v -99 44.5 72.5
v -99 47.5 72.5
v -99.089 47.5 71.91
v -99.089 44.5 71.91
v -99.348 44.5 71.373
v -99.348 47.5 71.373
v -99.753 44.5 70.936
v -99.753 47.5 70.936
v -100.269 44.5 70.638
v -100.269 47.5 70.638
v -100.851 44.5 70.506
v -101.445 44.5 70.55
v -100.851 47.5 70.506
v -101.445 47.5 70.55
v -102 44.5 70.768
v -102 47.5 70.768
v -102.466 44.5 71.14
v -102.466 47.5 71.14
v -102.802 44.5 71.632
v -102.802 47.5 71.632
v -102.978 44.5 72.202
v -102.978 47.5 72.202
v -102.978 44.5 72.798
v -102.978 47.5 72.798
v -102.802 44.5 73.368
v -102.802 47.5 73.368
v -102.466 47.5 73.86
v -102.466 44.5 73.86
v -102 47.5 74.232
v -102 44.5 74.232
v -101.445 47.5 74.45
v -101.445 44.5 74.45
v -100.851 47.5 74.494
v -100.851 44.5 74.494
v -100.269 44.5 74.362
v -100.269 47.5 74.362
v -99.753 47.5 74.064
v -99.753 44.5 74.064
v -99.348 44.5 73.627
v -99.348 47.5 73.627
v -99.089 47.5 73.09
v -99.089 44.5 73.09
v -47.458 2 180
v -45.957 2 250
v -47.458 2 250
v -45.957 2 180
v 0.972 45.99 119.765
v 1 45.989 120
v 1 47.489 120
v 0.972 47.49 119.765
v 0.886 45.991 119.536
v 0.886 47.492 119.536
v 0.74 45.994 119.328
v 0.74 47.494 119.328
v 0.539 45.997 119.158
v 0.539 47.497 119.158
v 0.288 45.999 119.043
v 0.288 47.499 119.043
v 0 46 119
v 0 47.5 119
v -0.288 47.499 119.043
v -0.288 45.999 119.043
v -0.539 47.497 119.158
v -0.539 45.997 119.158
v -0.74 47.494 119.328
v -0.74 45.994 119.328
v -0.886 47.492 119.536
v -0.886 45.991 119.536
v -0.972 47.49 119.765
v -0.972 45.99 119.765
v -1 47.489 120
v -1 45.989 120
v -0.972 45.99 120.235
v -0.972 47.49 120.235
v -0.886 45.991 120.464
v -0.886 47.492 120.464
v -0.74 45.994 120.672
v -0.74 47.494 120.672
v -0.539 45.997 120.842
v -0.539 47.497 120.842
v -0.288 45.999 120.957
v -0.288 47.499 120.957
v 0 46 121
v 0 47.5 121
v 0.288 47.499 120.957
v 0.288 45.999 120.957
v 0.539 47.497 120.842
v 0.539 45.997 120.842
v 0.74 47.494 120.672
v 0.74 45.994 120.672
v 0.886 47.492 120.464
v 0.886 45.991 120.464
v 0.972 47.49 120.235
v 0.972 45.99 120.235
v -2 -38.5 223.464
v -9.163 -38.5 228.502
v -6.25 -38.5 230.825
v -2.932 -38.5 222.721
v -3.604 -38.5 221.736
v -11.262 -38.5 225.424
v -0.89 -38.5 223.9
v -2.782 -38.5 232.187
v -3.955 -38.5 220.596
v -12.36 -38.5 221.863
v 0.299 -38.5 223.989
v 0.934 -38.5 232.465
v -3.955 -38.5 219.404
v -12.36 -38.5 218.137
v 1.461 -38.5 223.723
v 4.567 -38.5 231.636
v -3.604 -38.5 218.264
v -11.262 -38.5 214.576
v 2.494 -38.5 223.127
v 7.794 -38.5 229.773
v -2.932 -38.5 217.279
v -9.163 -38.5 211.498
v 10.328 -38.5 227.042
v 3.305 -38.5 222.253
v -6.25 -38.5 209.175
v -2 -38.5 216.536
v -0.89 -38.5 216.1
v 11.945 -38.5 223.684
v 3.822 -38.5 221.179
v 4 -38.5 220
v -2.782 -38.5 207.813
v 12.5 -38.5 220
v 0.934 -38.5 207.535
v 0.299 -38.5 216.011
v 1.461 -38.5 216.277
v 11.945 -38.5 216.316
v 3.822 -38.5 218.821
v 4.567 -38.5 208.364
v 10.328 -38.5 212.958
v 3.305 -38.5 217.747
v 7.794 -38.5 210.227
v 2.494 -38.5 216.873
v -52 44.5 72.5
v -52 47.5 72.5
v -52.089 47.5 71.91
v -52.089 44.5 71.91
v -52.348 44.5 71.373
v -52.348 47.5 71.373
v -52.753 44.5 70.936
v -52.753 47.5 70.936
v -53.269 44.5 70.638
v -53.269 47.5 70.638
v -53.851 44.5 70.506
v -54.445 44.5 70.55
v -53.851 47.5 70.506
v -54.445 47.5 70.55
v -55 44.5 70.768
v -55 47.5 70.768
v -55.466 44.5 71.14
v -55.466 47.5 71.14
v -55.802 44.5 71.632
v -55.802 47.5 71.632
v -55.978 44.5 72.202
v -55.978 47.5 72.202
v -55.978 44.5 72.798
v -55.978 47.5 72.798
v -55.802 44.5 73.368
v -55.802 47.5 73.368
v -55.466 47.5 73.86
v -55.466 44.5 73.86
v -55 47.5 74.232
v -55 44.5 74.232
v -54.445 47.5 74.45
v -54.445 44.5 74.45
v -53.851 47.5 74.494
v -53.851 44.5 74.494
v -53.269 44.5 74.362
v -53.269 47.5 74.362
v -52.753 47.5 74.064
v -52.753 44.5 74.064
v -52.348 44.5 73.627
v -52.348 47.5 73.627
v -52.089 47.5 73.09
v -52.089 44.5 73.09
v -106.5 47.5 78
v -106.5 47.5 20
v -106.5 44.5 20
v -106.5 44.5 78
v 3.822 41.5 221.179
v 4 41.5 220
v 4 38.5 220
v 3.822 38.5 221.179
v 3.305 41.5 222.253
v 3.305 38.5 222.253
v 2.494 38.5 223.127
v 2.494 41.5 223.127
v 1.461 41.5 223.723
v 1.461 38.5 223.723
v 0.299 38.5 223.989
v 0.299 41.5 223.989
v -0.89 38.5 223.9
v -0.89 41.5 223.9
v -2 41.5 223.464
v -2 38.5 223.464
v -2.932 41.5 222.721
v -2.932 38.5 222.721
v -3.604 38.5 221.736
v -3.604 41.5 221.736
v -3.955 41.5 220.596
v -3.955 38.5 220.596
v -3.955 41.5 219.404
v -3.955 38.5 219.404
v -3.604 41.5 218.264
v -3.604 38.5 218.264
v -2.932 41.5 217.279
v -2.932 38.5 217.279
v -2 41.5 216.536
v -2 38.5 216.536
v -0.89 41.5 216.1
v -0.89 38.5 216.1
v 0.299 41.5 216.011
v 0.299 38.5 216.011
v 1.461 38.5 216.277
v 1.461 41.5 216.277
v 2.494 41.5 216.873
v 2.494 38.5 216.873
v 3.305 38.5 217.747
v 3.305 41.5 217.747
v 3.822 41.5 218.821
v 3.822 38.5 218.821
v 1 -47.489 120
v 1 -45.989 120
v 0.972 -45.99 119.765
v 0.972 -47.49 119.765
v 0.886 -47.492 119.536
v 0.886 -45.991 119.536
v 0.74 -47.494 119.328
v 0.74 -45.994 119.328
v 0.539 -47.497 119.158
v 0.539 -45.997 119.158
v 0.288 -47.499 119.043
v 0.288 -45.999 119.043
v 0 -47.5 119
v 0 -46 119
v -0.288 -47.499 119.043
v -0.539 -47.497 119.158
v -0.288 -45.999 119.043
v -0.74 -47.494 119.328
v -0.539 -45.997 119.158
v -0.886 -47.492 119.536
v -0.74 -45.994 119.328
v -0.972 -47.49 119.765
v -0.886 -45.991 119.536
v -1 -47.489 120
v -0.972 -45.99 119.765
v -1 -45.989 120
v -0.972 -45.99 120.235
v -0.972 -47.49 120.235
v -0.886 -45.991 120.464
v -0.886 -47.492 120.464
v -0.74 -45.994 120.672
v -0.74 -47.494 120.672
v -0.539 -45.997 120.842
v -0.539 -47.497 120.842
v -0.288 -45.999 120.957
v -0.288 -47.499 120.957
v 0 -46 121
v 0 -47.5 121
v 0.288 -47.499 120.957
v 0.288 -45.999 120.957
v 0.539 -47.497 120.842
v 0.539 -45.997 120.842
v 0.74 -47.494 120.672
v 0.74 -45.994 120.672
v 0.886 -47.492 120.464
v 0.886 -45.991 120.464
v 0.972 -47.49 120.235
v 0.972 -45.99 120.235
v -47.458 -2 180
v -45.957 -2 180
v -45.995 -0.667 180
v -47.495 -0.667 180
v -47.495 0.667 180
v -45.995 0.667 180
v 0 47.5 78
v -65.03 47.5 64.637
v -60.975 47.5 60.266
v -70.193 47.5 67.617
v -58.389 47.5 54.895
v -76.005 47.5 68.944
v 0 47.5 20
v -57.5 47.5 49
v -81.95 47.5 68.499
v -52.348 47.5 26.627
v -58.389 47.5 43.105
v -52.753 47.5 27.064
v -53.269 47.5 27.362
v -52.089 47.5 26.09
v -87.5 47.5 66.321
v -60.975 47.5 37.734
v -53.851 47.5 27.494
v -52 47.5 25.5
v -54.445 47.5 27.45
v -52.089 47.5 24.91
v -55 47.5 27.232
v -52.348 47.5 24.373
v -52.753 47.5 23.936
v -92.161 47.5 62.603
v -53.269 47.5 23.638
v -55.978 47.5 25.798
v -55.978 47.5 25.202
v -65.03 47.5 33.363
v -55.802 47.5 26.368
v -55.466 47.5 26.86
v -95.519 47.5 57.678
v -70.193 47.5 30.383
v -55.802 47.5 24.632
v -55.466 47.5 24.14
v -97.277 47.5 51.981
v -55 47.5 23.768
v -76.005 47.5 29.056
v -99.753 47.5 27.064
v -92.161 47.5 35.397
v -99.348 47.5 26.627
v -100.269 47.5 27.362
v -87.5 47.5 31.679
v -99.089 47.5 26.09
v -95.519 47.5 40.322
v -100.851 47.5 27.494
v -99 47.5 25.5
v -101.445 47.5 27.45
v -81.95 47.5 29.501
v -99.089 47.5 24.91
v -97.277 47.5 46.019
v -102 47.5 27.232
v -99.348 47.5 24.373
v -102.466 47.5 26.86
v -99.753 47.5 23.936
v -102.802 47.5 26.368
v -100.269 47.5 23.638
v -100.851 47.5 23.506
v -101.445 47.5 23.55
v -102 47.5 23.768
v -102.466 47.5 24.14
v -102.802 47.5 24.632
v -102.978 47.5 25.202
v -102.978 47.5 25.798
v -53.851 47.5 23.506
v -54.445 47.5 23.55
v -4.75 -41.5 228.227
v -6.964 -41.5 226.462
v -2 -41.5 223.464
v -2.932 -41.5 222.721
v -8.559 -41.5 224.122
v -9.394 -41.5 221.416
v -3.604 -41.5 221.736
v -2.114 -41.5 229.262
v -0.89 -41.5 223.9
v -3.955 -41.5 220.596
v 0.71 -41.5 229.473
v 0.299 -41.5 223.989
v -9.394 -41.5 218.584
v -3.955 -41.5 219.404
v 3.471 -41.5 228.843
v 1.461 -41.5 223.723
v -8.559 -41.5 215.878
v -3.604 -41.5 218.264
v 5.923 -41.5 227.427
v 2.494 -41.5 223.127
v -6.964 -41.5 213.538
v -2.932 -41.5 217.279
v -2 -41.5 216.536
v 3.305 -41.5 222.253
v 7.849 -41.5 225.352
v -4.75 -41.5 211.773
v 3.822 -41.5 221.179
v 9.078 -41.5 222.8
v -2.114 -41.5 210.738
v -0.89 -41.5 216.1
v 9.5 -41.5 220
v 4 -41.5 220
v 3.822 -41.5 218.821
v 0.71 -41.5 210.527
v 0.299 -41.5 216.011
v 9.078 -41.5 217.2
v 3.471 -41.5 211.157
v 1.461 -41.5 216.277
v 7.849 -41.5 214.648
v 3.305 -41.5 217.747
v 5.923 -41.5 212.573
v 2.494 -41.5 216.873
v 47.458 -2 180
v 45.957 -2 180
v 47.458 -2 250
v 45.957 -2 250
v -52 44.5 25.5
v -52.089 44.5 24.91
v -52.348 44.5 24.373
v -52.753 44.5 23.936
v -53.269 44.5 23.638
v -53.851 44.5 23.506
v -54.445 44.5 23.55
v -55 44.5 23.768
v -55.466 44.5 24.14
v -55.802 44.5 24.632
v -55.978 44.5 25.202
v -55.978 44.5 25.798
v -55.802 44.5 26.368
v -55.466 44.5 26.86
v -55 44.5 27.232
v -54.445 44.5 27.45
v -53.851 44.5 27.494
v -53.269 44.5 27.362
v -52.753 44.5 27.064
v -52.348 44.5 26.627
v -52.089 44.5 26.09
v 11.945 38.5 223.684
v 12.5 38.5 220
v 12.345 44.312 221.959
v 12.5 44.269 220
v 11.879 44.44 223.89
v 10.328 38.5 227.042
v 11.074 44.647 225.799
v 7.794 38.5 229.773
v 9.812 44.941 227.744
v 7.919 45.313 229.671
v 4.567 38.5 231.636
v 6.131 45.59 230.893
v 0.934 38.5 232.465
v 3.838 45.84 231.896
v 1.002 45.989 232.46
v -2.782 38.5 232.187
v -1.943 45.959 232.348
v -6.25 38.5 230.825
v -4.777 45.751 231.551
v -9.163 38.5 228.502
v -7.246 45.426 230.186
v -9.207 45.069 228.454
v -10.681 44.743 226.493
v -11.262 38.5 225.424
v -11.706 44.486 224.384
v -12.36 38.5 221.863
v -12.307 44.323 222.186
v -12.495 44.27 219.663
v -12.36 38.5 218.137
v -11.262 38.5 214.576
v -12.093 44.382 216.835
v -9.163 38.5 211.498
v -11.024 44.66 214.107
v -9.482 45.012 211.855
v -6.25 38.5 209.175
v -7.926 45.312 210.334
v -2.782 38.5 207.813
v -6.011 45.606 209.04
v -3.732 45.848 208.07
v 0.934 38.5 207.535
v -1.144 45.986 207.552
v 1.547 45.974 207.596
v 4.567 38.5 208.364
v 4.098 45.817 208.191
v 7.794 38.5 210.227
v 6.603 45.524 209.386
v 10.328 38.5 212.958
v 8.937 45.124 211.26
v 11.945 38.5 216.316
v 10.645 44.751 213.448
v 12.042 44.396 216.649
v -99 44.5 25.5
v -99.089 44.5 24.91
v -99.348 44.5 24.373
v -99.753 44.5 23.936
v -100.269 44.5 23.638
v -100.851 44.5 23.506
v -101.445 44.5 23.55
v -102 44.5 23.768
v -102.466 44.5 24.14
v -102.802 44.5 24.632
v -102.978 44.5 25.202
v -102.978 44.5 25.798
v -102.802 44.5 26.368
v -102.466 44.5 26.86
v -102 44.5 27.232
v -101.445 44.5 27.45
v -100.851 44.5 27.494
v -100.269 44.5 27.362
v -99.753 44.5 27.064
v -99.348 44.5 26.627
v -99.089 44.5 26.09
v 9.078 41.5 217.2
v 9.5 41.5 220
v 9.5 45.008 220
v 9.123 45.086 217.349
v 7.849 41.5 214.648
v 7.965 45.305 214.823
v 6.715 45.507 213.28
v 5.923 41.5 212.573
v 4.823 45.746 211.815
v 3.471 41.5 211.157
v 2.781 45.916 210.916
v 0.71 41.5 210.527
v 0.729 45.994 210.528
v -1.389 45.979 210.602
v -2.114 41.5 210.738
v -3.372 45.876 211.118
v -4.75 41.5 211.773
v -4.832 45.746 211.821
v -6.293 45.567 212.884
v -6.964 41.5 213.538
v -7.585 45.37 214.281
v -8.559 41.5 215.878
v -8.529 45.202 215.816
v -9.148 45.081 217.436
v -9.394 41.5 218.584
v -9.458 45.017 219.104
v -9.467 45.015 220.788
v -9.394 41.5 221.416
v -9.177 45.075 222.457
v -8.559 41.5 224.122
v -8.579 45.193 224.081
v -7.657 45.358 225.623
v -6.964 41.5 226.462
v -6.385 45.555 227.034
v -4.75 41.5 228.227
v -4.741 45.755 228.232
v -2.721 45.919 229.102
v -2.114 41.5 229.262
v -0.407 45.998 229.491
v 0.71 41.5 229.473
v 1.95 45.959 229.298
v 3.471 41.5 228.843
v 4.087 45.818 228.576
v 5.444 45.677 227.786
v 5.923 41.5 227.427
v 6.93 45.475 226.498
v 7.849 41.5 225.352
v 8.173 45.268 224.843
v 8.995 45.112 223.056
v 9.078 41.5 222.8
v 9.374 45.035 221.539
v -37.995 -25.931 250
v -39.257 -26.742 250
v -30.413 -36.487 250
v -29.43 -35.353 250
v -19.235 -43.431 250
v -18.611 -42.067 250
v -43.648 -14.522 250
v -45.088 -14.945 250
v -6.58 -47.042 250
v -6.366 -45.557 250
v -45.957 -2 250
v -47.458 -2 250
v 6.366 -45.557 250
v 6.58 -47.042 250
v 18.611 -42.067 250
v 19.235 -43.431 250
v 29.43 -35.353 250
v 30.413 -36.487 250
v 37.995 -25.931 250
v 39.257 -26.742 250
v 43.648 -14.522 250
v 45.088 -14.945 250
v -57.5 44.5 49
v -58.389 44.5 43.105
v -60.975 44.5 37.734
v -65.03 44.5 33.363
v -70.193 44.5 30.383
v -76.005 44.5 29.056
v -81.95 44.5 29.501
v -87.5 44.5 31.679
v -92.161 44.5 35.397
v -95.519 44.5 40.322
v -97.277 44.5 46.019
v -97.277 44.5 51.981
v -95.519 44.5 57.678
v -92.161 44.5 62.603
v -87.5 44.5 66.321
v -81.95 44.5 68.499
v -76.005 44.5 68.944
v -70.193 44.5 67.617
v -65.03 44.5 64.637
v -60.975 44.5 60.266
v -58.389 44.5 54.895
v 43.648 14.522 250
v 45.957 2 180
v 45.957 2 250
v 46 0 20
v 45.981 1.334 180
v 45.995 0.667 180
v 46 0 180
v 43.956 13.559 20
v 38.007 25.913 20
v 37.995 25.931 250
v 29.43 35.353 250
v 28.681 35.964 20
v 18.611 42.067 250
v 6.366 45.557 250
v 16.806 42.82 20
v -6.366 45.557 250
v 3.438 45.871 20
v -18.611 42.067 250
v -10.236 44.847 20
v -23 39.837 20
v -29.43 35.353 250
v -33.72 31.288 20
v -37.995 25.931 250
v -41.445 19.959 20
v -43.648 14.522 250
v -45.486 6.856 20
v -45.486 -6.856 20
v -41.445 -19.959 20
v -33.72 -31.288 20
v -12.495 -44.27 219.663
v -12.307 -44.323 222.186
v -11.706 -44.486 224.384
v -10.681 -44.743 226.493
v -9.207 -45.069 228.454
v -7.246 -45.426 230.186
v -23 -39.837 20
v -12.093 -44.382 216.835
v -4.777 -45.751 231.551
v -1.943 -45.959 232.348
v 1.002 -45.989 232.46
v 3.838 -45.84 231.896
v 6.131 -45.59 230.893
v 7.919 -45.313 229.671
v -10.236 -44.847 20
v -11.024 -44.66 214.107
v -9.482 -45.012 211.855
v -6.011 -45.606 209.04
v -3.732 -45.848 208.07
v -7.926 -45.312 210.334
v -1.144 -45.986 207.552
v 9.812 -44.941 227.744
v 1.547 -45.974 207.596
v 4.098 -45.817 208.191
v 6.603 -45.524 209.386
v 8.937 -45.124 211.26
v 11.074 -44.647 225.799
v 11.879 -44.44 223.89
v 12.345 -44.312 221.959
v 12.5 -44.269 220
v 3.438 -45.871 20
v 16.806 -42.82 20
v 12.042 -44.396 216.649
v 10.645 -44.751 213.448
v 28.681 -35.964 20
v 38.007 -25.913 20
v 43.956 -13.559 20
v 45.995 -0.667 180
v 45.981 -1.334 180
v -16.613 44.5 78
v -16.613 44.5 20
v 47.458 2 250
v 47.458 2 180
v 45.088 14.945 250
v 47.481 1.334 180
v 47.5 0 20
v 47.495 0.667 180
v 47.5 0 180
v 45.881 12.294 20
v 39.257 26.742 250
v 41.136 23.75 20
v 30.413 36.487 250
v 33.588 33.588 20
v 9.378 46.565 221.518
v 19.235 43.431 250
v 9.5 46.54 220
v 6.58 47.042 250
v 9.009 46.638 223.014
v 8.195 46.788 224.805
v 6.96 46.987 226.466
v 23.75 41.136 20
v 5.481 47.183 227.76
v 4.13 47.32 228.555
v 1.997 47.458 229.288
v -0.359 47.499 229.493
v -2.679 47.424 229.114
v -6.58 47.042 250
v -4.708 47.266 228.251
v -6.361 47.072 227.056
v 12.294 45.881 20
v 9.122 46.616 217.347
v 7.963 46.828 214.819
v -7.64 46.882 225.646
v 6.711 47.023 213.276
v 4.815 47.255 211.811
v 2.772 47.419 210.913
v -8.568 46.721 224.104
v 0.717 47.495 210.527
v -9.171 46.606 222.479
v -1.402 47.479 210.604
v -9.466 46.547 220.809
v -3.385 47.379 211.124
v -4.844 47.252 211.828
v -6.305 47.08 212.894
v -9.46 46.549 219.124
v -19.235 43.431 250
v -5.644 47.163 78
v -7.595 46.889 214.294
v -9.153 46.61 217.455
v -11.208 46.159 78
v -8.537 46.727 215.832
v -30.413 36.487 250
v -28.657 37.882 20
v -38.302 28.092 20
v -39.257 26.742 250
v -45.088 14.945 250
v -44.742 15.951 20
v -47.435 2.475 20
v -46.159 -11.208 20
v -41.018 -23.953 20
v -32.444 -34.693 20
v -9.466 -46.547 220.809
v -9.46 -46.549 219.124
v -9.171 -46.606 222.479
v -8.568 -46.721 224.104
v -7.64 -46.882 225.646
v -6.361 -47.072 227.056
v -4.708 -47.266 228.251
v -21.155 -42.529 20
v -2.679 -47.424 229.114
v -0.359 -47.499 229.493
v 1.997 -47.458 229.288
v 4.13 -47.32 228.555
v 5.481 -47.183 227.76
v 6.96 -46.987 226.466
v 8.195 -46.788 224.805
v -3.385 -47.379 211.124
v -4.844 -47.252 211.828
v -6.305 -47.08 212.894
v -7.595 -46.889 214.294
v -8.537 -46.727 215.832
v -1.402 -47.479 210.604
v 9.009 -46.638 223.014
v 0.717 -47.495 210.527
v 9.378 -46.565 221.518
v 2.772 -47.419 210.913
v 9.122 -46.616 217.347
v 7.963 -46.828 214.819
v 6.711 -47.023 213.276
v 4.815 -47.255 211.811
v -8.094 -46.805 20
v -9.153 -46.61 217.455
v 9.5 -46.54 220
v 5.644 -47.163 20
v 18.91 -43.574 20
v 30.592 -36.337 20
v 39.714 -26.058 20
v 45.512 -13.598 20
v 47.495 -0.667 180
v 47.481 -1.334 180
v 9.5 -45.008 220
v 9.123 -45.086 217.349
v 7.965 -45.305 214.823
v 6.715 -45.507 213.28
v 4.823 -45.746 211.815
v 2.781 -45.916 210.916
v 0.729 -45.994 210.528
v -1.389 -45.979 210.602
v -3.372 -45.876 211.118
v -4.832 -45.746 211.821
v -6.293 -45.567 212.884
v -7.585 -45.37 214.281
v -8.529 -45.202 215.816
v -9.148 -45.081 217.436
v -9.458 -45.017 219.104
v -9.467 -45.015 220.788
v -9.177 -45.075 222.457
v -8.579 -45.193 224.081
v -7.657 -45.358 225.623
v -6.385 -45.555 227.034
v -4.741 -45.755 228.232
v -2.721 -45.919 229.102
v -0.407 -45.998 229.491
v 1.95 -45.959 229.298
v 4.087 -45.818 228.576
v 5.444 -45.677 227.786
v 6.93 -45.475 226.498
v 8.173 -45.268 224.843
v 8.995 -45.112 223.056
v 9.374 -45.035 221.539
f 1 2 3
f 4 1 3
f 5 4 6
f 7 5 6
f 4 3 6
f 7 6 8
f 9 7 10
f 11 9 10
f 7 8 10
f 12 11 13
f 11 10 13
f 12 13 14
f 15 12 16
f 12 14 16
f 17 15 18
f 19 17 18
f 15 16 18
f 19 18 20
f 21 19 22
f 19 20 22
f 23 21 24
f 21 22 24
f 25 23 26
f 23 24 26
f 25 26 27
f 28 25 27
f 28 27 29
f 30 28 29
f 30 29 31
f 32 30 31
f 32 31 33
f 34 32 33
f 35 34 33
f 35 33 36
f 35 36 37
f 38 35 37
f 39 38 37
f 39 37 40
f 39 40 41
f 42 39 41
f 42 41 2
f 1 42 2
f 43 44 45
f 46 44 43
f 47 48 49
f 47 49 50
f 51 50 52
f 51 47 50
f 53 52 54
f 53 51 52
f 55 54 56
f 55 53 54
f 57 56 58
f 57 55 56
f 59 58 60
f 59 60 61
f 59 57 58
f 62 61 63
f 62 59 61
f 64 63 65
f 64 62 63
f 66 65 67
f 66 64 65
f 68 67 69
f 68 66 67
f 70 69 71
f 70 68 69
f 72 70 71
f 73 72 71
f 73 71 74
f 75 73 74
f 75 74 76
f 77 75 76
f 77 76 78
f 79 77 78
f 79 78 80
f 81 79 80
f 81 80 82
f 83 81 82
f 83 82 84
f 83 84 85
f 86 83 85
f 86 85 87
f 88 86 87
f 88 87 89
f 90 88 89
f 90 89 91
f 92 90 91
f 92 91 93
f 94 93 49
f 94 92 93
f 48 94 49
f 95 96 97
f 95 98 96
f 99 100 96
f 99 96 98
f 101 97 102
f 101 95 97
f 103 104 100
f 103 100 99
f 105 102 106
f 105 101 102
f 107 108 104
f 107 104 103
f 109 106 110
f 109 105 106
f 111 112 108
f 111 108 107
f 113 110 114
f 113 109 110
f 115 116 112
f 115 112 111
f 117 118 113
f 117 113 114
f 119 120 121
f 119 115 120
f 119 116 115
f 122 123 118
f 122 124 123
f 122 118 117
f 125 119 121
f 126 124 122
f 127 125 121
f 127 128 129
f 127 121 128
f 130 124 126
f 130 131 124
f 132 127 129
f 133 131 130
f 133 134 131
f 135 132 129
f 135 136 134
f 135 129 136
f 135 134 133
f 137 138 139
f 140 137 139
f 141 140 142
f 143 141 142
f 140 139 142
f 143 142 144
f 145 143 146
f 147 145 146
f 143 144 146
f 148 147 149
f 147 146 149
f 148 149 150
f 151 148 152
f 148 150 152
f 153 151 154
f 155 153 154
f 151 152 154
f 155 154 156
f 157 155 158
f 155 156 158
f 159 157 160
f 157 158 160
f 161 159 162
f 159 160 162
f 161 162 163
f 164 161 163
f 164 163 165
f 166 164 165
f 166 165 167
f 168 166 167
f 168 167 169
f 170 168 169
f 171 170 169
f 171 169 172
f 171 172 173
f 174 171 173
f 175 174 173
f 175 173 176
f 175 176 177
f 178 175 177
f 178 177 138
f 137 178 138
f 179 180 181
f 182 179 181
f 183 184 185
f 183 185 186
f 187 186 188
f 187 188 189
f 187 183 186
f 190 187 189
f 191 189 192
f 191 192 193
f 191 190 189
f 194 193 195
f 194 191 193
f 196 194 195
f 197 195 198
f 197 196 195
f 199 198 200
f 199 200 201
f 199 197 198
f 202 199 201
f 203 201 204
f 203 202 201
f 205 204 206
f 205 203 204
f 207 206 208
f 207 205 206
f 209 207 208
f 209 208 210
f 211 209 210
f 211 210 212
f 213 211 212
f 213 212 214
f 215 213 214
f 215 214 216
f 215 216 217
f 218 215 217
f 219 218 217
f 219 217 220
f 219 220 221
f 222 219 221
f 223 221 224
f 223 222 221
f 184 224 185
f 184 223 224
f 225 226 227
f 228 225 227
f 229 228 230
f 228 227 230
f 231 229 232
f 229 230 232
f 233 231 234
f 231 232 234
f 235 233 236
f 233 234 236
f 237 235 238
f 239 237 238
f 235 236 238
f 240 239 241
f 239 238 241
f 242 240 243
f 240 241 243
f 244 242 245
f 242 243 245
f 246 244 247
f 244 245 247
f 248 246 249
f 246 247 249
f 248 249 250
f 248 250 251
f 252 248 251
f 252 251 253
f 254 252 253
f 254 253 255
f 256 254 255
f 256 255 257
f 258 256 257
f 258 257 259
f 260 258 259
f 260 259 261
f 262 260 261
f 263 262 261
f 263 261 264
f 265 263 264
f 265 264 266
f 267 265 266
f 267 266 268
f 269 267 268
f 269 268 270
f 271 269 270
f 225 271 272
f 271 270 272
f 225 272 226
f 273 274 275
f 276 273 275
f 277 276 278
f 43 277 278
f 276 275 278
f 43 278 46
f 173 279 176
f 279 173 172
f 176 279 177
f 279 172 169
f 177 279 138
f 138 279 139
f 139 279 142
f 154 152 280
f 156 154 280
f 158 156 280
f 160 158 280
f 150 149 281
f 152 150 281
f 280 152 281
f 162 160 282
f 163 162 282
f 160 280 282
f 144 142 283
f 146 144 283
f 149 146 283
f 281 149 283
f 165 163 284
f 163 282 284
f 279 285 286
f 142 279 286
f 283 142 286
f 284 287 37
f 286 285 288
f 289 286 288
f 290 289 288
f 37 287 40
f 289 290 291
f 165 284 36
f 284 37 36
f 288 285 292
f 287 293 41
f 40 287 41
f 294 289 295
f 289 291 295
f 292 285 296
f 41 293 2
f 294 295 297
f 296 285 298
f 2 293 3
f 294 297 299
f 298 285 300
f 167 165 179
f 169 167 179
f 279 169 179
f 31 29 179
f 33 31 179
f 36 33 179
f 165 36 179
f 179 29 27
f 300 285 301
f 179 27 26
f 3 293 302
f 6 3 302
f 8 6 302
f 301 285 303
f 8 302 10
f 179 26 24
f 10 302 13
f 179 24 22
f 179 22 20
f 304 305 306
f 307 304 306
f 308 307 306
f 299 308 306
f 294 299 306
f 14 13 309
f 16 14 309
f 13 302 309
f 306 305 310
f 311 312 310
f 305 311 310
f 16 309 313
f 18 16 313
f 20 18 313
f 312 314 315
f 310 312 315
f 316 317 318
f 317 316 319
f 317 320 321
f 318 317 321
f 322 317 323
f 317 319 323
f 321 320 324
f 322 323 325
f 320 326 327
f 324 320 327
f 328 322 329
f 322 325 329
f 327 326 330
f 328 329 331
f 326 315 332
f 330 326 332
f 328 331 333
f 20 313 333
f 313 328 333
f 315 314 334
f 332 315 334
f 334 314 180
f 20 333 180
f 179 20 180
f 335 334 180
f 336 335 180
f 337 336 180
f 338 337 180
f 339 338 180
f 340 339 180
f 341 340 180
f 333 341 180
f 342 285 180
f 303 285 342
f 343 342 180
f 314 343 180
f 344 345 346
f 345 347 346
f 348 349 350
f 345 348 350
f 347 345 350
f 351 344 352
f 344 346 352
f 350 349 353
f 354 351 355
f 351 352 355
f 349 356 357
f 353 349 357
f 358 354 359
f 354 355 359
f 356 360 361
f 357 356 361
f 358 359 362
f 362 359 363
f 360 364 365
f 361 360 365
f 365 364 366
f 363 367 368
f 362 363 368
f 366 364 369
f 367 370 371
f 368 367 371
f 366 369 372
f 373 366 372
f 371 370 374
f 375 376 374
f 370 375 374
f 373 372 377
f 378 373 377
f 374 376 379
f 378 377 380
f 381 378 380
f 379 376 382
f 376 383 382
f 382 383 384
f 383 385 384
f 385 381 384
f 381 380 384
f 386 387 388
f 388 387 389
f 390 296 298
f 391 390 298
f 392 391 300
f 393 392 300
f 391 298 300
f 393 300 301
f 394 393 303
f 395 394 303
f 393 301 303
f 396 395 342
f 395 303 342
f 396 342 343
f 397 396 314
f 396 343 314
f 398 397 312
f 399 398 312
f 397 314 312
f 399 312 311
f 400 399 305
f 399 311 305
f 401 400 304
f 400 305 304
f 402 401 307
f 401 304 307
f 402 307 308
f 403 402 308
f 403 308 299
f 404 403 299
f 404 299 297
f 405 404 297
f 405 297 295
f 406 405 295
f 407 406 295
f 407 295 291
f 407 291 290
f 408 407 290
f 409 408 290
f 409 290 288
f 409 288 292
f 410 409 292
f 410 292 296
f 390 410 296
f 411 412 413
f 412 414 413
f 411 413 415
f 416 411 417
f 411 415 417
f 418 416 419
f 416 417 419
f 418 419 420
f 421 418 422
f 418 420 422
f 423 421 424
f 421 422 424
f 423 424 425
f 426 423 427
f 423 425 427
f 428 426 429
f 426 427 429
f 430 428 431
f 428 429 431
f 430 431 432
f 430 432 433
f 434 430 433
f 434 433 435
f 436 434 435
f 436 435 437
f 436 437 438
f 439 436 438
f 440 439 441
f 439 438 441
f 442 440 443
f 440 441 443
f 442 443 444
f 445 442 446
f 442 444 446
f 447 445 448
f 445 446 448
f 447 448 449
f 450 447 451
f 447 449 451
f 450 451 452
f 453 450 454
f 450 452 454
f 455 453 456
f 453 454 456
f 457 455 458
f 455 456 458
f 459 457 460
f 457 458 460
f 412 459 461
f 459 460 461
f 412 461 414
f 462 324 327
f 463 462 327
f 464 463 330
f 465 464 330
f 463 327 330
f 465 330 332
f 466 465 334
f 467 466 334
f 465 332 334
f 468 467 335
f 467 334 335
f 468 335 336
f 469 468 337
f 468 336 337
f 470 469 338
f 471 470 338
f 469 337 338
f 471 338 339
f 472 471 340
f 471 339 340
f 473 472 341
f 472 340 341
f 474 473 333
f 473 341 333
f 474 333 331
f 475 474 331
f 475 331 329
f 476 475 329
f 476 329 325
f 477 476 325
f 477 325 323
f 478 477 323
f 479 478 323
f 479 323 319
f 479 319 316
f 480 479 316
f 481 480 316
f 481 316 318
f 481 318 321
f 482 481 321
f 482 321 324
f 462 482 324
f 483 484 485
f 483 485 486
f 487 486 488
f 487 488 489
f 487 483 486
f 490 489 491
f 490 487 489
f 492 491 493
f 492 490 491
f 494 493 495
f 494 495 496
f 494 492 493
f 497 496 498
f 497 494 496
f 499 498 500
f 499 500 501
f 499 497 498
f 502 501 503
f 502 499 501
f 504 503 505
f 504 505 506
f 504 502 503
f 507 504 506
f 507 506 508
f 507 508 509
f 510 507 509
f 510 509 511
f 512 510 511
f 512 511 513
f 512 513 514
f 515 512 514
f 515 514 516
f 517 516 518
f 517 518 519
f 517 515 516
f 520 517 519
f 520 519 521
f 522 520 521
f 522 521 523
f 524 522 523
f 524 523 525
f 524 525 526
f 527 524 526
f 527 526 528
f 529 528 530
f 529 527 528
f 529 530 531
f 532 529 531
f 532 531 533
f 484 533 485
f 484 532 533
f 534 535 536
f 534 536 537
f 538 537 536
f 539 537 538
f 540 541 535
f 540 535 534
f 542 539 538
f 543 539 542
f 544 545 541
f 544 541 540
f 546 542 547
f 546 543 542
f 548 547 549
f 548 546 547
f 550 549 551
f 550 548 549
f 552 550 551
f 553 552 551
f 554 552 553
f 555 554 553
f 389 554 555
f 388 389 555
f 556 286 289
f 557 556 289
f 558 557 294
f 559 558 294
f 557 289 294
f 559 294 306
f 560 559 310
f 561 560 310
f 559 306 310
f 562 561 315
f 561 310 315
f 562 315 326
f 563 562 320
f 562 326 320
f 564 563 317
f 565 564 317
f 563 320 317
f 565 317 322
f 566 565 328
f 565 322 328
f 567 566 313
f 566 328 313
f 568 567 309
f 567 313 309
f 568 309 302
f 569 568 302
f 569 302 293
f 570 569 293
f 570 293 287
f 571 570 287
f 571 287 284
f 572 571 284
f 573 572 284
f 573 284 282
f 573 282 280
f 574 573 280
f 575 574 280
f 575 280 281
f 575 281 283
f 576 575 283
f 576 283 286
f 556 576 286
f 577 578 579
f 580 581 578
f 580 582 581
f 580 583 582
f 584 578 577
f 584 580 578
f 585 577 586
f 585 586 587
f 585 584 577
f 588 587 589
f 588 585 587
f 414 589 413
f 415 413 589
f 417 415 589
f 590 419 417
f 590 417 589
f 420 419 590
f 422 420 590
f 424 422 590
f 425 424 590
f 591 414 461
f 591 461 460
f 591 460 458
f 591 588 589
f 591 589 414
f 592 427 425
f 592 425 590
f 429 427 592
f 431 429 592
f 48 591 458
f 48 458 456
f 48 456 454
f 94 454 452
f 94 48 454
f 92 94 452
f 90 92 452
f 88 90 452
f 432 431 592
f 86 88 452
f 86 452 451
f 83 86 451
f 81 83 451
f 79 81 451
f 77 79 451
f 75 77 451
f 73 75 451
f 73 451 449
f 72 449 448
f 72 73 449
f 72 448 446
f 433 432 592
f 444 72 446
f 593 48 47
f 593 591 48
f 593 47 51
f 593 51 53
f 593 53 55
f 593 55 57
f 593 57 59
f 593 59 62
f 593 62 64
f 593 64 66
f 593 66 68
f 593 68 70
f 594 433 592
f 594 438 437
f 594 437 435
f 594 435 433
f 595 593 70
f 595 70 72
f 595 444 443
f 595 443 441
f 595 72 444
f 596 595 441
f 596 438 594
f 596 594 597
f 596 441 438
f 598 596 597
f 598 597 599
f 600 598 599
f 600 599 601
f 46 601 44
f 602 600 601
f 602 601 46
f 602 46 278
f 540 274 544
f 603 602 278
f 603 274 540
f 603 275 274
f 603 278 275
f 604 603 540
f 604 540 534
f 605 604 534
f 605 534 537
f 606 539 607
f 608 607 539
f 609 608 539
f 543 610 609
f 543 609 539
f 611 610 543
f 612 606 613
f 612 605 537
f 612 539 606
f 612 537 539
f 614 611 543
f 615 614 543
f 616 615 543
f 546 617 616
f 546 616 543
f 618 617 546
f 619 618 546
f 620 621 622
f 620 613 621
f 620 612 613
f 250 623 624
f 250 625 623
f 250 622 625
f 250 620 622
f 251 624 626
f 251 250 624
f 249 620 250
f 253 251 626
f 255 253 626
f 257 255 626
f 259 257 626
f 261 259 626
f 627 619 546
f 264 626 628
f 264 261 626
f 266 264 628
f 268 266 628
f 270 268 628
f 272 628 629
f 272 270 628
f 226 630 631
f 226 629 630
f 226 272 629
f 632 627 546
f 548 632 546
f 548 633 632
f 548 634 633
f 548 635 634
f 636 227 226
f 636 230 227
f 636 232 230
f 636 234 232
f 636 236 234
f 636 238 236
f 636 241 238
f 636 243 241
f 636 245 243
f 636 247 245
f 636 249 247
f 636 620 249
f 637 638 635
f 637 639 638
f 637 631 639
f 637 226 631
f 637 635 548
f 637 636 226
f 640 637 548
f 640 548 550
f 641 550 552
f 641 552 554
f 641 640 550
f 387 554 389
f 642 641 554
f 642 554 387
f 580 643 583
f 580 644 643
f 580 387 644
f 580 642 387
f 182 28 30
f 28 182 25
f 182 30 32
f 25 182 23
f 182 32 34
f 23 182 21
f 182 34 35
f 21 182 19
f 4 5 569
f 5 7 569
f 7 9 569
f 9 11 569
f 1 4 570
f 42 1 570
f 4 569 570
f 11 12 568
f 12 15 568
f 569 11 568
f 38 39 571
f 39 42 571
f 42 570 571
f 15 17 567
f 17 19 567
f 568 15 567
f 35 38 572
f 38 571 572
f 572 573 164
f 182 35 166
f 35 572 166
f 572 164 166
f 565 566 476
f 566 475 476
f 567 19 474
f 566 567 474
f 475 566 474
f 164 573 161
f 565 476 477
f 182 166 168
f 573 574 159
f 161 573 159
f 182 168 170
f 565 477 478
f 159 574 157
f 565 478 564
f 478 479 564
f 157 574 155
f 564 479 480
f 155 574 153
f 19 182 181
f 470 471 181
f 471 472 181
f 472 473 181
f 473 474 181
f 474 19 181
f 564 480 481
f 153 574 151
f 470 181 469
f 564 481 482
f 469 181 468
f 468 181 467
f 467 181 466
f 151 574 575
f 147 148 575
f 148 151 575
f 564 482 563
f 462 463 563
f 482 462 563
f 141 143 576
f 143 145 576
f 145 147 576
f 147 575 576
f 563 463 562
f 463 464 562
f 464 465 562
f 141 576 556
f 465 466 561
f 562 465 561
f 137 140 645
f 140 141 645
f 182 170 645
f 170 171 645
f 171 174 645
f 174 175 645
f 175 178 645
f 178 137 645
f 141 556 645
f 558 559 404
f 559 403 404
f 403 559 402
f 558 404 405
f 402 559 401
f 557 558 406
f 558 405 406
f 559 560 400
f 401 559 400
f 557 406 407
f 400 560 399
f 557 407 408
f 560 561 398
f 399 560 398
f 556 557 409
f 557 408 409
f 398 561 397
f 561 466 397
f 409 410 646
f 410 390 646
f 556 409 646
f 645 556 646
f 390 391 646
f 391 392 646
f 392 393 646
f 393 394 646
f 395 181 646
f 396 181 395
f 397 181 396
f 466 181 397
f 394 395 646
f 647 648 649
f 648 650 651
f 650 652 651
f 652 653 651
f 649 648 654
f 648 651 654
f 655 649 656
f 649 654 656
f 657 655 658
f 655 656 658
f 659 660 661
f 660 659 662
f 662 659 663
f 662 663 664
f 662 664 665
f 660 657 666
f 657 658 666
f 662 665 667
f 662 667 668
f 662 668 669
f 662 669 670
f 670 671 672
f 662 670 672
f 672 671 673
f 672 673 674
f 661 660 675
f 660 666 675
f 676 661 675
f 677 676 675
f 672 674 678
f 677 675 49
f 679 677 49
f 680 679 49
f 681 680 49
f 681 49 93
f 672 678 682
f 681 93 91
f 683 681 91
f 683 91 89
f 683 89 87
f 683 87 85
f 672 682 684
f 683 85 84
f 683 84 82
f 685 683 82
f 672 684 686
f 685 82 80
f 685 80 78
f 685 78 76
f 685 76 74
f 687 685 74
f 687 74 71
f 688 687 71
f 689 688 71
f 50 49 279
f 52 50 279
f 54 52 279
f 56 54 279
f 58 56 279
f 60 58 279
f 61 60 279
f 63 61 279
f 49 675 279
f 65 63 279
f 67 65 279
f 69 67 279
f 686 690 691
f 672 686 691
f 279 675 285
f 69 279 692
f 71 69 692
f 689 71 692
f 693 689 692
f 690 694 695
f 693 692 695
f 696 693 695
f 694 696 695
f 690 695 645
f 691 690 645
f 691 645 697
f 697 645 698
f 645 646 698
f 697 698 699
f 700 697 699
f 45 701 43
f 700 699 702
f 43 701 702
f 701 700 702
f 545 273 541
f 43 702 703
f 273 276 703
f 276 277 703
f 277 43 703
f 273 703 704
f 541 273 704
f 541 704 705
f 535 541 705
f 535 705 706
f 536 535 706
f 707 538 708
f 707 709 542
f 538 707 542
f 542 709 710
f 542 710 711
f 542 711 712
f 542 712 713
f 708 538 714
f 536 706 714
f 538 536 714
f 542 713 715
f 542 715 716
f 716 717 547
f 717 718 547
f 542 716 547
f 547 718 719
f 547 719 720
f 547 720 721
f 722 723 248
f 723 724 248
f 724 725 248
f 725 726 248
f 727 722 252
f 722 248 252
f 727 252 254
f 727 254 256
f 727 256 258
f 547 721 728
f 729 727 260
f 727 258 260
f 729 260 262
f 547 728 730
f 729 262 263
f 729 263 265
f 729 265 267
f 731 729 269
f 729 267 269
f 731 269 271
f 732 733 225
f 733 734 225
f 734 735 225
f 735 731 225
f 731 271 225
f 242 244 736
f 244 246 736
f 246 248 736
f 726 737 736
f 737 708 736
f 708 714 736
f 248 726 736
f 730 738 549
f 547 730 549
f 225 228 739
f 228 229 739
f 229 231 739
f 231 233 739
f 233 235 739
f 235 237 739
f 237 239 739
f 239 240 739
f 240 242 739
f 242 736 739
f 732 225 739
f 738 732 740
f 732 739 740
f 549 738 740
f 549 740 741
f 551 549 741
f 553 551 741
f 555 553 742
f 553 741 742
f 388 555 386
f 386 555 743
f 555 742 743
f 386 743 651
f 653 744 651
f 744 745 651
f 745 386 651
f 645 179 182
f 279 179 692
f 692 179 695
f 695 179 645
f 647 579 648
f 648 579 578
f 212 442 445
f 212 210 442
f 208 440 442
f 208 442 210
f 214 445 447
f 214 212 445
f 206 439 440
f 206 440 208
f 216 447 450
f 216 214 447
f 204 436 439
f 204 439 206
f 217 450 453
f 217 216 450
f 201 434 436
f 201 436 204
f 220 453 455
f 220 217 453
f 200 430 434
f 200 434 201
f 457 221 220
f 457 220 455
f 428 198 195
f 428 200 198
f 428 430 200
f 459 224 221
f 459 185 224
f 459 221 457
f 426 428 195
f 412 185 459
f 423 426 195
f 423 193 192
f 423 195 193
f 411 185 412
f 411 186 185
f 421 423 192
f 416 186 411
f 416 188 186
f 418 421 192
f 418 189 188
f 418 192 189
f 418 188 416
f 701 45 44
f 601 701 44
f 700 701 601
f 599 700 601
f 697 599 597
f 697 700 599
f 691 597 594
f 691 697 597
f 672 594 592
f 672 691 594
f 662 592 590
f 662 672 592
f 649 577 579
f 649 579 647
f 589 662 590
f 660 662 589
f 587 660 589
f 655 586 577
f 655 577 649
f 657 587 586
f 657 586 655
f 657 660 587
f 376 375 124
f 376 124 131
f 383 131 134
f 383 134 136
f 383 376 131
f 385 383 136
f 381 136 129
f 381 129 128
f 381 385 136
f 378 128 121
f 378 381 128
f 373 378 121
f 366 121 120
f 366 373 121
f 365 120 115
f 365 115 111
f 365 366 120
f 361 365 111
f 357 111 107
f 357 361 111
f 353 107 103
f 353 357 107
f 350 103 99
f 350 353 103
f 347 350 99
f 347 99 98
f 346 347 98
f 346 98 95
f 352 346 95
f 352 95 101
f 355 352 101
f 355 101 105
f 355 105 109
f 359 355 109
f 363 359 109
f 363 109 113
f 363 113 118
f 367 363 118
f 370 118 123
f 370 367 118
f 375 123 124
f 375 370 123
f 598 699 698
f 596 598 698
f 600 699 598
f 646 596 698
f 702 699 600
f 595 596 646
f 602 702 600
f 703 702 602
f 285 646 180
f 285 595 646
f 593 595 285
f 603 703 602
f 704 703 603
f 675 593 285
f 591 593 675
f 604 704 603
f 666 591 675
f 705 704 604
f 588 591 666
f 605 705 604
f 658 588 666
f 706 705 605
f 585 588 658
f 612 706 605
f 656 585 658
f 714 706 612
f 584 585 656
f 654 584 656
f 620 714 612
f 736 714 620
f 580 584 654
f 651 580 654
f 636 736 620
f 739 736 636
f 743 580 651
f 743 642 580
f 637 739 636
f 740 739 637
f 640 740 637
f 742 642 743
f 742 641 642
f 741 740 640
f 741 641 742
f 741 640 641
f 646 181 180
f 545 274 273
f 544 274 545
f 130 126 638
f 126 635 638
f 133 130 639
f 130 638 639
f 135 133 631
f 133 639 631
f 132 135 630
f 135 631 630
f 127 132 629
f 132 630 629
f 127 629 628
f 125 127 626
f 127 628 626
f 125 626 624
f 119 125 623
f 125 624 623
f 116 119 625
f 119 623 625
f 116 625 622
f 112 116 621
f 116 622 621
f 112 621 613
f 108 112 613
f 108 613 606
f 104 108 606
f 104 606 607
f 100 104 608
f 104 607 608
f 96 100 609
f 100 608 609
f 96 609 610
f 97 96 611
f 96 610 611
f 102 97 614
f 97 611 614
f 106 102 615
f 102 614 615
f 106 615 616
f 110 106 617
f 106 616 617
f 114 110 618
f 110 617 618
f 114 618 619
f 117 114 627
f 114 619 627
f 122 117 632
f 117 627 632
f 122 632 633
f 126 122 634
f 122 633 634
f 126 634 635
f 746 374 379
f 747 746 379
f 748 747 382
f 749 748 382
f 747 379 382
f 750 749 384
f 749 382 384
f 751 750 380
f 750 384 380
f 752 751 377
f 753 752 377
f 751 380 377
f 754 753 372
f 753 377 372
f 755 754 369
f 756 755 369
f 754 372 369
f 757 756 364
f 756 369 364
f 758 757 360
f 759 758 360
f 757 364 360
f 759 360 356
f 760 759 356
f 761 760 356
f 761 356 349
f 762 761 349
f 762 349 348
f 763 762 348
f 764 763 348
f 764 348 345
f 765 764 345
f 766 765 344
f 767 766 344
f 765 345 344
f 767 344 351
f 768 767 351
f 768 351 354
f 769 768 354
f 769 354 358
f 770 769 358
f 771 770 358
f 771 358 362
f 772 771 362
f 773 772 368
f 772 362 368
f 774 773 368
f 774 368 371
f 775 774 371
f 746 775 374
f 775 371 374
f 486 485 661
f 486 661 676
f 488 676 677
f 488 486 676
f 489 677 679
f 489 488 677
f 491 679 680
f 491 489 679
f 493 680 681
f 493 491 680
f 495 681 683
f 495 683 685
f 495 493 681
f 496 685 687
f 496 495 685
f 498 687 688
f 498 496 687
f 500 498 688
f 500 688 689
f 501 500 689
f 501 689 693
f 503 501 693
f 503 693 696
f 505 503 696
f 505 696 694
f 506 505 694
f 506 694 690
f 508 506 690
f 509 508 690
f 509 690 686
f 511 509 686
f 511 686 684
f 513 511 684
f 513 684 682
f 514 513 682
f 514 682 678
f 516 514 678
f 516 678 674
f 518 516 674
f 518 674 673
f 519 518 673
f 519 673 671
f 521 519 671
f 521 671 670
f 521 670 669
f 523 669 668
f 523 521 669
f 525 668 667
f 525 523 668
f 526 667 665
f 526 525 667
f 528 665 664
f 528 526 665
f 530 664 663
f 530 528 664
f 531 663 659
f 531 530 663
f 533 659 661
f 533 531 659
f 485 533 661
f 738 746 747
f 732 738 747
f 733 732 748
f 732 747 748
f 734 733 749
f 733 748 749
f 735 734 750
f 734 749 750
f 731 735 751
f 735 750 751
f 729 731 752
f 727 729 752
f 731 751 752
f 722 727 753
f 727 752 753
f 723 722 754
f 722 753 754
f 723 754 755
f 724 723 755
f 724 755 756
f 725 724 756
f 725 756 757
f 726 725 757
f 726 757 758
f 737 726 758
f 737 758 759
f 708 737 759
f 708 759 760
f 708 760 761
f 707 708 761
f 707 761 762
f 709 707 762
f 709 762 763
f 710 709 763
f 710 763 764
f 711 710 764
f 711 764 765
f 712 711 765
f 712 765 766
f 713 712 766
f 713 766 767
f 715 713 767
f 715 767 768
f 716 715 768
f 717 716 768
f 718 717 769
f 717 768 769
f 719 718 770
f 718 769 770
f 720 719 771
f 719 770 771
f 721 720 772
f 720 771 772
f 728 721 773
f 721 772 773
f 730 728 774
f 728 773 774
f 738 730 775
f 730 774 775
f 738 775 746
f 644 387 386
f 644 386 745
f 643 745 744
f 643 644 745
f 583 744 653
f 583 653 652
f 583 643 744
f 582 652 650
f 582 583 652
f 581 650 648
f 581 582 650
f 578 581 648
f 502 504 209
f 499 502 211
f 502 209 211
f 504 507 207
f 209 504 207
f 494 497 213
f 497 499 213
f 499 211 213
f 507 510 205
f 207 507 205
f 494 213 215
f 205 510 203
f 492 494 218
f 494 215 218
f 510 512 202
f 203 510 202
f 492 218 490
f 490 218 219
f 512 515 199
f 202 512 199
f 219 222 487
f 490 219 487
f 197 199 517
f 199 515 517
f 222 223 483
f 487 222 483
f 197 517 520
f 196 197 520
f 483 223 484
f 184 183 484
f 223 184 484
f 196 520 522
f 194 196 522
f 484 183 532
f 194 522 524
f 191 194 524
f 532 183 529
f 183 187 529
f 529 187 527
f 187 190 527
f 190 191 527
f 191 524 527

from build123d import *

# Parameters (mm, degrees)
SKETCH1_R               = 47.5
SKETCH1_R_2             = 46
BOSS_EXTRUDE1_DEPTH     = 250
CUT_EXTRUDE1_DEPTH      = 250
CUT_EXTRUDE1_DEPTH_BACK = 250
SKETCH2_R               = 1
CUT_EXTRUDE2_DEPTH      = 75
CUT_EXTRUDE2_DEPTH_BACK = 79
SKETCH3_W               = 95
SKETCH3_H               = 20
CUT_EXTRUDE3_DEPTH      = 64
CUT_EXTRUDE3_DEPTH_BACK = 73
SKETCH4_R               = 9.5
BOSS_EXTRUDE2_REACH     = 271.587
SKETCH5_R               = 12.5
SKETCH5_R_2             = 9.5
BOSS_EXTRUDE7_START     = 3
SKETCH10_R              = 12.5
SKETCH10_R_2            = 4
BOSS_EXTRUDE7_DEPTH     = 3
BOSS_EXTRUDE8_REACH     = 271.587
SKETCH12_R              = 12.5
SKETCH12_R_2            = 9.5
SKETCH13_R              = 12.5
SKETCH13_R_2            = 4
BOSS_EXTRUDE9_DEPTH     = 3
BOSS_EXTRUDE11_DEPTH    = 58
SKETCH18_R              = 2
SKETCH18_R_2            = 20
CUT_EXTRUDE5_DEPTH      = 58
CUT_EXTRUDE6_DEPTH      = 98
CUT_EXTRUDE6_DEPTH_BACK = 82


with BuildPart() as part:
    # Sketch1 → Boss-Extrude1 (new body)
    with BuildSketch(Plane.XY):
        Circle(SKETCH1_R)
        Circle(SKETCH1_R_2, mode=Mode.SUBTRACT)
    extrude(amount=BOSS_EXTRUDE1_DEPTH)

    # Sketch2 → Cut-Extrude1 (cut, two sides: drawn at the far end of the back side and taken through both)
    with BuildSketch(Plane(origin=(0, 0, 0), x_dir=(1, 0, 0), z_dir=(0, 1, 0)).offset(-CUT_EXTRUDE1_DEPTH_BACK)):
        with Locations((0, -120)):
            Circle(SKETCH2_R)
    extrude(amount=CUT_EXTRUDE1_DEPTH + CUT_EXTRUDE1_DEPTH_BACK, mode=Mode.SUBTRACT)

    # Sketch3 → Cut-Extrude2 (cut, two sides: drawn at the far end of the back side and taken through both)
    with BuildSketch(Plane(origin=(0, 0, 0), x_dir=(1, 0, 0), z_dir=(0, 1, 0)).offset(-CUT_EXTRUDE2_DEPTH_BACK)):
        with Locations((0, -10)):
            Rectangle(SKETCH3_W, SKETCH3_H)
    extrude(amount=CUT_EXTRUDE2_DEPTH + CUT_EXTRUDE2_DEPTH_BACK, mode=Mode.SUBTRACT)

    # Sketch4 → Cut-Extrude3 (cut, two sides: drawn at the far end of the back side and taken through both)
    with BuildSketch(Plane(origin=(0, 0, 0), x_dir=(1, 0, 0), z_dir=(0, 1, 0)).offset(-CUT_EXTRUDE3_DEPTH_BACK)):
        with Locations((0, -220)):
            Circle(SKETCH4_R)
    extrude(amount=CUT_EXTRUDE3_DEPTH + CUT_EXTRUDE3_DEPTH_BACK, mode=Mode.SUBTRACT)

    # Sketch5 → Boss-Extrude2 (add, up to next)
    with BuildSketch(Plane(origin=(0, 41.5, 0), x_dir=(1, 0, 0), z_dir=(0, 1, 0)), mode=Mode.PRIVATE) as boss_extrude2_sk1:
        with Locations((0, -220)):
            Circle(SKETCH5_R)
        with Locations((0, -220)):
            Circle(SKETCH5_R_2, mode=Mode.SUBTRACT)
    boss_extrude2_tool1 = extrude(boss_extrude2_sk1.sketch, amount=BOSS_EXTRUDE2_REACH, mode=Mode.PRIVATE) - part.part
    add(boss_extrude2_tool1.solids().sort_by_distance((-12.146447, 41.5, 220))[0])

    # Sketch10 → Boss-Extrude7 (add)
    with BuildSketch(Plane.XZ.offset(-41.5).offset(BOSS_EXTRUDE7_START)):
        with Locations((0, 220)):
            Circle(SKETCH10_R)
        with Locations((0, 220)):
            Circle(SKETCH10_R_2, mode=Mode.SUBTRACT)
    extrude(amount=-BOSS_EXTRUDE7_DEPTH)

    # Sketch12 → Boss-Extrude8 (add, up to next)
    with BuildSketch(Plane(origin=(0, -41.5, 0), x_dir=(1, 0, 0), z_dir=(0, 1, 0)), mode=Mode.PRIVATE) as boss_extrude8_sk1:
        with Locations((0, -220)):
            Circle(SKETCH12_R)
        with Locations((0, -220)):
            Circle(SKETCH12_R_2, mode=Mode.SUBTRACT)
    boss_extrude8_tool1 = extrude(boss_extrude8_sk1.sketch, amount=-BOSS_EXTRUDE8_REACH, mode=Mode.PRIVATE) - part.part
    add(boss_extrude8_tool1.solids().sort_by_distance((-12.146447, -41.5, 220))[0])

    # Sketch13 → Boss-Extrude9 (add)
    with BuildSketch(Plane(origin=(0, -41.5, 0), x_dir=(1, 0, 0), z_dir=(0, 1, 0))):
        with Locations((0, -220)):
            Circle(SKETCH13_R)
        with Locations((0, -220)):
            Circle(SKETCH13_R_2, mode=Mode.SUBTRACT)
    extrude(amount=BOSS_EXTRUDE9_DEPTH)

    # Sketch17 → Boss-Extrude11 (add)
    with BuildSketch(Plane.XY.offset(20)):
        with BuildLine():
            Line((0, 47.5), (-106.5, 47.5))
            Line((-106.5, 47.5), (-106.5, 44.5))
            Line((-106.5, 44.5), (-16.613247726, 44.5))
            ThreePointArc((-16.613247726, 44.5), (-8.440971508, 46.74398357), (0, 47.5))
        make_face()
    extrude(amount=BOSS_EXTRUDE11_DEPTH)

    # Sketch18 → Cut-Extrude5 (cut)
    with BuildSketch(Plane(origin=(0, 47.5, 0), x_dir=(1, 0, 0), z_dir=(0, 1, 0))):
        with Locations((-101, -72.5)):
            Circle(SKETCH18_R)
        with Locations((-101, -25.5)):
            Circle(SKETCH18_R)
        with Locations((-54, -25.5)):
            Circle(SKETCH18_R)
        with Locations((-54, -72.5)):
            Circle(SKETCH18_R)
        with Locations((-77.5, -49)):
            Circle(SKETCH18_R_2)
    extrude(amount=-CUT_EXTRUDE5_DEPTH, mode=Mode.SUBTRACT)

    # Sketch19 → Cut-Extrude6 (cut, two sides: drawn at the far end of the back side and taken through both)
    with BuildSketch(Plane(origin=(0, 0, 0), x_dir=(0, 0, -1), z_dir=(1, 0, 0)).offset(-CUT_EXTRUDE6_DEPTH_BACK)):
        Polygon((-180, 0), (-180, -2), (-250, -2), (-250, 0), (-250, 2), (-180, 2), align=None)
    extrude(amount=CUT_EXTRUDE6_DEPTH + CUT_EXTRUDE6_DEPTH_BACK, mode=Mode.SUBTRACT)


solid = part.part
